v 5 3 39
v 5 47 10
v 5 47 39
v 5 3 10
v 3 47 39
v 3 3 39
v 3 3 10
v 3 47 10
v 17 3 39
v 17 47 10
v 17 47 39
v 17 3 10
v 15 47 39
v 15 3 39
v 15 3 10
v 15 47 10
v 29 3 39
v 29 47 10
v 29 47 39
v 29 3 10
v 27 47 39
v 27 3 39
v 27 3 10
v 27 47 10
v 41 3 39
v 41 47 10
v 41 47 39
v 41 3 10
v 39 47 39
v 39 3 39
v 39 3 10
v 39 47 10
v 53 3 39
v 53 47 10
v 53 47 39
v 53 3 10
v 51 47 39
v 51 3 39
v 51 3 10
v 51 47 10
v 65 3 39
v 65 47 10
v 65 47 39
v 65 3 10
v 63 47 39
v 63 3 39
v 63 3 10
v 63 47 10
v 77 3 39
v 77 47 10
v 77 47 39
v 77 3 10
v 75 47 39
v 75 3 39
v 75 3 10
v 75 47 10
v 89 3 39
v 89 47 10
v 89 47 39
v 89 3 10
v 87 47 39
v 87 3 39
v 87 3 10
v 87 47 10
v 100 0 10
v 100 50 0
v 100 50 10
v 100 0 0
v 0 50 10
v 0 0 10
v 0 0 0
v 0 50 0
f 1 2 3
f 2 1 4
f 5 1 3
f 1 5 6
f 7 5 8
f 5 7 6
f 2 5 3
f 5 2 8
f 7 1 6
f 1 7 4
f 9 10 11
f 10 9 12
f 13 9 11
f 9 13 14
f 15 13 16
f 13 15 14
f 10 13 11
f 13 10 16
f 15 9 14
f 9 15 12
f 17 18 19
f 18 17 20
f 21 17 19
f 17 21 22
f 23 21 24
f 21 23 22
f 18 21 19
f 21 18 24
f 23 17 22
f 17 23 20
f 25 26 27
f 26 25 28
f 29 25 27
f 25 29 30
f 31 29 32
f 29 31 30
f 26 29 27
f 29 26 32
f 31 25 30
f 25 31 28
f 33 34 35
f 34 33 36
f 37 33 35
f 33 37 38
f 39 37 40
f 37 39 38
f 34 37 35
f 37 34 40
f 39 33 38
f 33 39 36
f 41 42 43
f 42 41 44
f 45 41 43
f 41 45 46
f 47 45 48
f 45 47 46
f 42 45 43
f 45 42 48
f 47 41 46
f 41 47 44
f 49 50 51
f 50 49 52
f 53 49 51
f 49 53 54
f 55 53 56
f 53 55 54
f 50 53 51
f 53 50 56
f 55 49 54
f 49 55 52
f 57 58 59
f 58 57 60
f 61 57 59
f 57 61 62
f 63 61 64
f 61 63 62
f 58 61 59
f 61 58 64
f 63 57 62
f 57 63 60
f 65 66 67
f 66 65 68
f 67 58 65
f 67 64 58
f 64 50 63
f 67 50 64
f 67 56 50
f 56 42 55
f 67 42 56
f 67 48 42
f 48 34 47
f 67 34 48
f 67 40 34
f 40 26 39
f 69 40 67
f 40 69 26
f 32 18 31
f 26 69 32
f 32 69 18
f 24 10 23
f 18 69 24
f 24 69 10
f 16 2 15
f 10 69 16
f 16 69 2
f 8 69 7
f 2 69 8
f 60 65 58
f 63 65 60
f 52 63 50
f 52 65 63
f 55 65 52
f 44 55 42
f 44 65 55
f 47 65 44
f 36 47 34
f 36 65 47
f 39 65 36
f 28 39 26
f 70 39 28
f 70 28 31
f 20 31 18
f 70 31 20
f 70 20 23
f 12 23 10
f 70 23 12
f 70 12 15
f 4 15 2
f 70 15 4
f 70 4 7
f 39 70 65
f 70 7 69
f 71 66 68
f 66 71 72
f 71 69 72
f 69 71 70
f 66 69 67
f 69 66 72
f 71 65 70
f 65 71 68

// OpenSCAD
$fn = 32;

// ----------------------------------------------------------------------
// Heatsink: uniform fin block
// ----------------------------------------------------------------------

// --- parameters (mm) ---
base_l = 100;             // base length, X
base_w = 50;              // base width, Y
base_t = 10;              // base plate thickness
fin_h = 30;               // fin height above the base
fin_t = 2;                // fin thickness
edge = 3;                 // margin from the base ends
pitch = 12;               // fin pitch

n_fins = floor((base_l - 2 * edge - fin_t) / pitch) + 1;  // fin count
total_h = base_t + fin_h - 1;  // overall height

union() {
  cube([base_l, base_w, base_t]);
  for (i = [0 : n_fins - 1])
    translate([edge + i * pitch, edge, base_t - 1])
      cube([fin_t, base_w - 2 * edge, fin_h]);
}
